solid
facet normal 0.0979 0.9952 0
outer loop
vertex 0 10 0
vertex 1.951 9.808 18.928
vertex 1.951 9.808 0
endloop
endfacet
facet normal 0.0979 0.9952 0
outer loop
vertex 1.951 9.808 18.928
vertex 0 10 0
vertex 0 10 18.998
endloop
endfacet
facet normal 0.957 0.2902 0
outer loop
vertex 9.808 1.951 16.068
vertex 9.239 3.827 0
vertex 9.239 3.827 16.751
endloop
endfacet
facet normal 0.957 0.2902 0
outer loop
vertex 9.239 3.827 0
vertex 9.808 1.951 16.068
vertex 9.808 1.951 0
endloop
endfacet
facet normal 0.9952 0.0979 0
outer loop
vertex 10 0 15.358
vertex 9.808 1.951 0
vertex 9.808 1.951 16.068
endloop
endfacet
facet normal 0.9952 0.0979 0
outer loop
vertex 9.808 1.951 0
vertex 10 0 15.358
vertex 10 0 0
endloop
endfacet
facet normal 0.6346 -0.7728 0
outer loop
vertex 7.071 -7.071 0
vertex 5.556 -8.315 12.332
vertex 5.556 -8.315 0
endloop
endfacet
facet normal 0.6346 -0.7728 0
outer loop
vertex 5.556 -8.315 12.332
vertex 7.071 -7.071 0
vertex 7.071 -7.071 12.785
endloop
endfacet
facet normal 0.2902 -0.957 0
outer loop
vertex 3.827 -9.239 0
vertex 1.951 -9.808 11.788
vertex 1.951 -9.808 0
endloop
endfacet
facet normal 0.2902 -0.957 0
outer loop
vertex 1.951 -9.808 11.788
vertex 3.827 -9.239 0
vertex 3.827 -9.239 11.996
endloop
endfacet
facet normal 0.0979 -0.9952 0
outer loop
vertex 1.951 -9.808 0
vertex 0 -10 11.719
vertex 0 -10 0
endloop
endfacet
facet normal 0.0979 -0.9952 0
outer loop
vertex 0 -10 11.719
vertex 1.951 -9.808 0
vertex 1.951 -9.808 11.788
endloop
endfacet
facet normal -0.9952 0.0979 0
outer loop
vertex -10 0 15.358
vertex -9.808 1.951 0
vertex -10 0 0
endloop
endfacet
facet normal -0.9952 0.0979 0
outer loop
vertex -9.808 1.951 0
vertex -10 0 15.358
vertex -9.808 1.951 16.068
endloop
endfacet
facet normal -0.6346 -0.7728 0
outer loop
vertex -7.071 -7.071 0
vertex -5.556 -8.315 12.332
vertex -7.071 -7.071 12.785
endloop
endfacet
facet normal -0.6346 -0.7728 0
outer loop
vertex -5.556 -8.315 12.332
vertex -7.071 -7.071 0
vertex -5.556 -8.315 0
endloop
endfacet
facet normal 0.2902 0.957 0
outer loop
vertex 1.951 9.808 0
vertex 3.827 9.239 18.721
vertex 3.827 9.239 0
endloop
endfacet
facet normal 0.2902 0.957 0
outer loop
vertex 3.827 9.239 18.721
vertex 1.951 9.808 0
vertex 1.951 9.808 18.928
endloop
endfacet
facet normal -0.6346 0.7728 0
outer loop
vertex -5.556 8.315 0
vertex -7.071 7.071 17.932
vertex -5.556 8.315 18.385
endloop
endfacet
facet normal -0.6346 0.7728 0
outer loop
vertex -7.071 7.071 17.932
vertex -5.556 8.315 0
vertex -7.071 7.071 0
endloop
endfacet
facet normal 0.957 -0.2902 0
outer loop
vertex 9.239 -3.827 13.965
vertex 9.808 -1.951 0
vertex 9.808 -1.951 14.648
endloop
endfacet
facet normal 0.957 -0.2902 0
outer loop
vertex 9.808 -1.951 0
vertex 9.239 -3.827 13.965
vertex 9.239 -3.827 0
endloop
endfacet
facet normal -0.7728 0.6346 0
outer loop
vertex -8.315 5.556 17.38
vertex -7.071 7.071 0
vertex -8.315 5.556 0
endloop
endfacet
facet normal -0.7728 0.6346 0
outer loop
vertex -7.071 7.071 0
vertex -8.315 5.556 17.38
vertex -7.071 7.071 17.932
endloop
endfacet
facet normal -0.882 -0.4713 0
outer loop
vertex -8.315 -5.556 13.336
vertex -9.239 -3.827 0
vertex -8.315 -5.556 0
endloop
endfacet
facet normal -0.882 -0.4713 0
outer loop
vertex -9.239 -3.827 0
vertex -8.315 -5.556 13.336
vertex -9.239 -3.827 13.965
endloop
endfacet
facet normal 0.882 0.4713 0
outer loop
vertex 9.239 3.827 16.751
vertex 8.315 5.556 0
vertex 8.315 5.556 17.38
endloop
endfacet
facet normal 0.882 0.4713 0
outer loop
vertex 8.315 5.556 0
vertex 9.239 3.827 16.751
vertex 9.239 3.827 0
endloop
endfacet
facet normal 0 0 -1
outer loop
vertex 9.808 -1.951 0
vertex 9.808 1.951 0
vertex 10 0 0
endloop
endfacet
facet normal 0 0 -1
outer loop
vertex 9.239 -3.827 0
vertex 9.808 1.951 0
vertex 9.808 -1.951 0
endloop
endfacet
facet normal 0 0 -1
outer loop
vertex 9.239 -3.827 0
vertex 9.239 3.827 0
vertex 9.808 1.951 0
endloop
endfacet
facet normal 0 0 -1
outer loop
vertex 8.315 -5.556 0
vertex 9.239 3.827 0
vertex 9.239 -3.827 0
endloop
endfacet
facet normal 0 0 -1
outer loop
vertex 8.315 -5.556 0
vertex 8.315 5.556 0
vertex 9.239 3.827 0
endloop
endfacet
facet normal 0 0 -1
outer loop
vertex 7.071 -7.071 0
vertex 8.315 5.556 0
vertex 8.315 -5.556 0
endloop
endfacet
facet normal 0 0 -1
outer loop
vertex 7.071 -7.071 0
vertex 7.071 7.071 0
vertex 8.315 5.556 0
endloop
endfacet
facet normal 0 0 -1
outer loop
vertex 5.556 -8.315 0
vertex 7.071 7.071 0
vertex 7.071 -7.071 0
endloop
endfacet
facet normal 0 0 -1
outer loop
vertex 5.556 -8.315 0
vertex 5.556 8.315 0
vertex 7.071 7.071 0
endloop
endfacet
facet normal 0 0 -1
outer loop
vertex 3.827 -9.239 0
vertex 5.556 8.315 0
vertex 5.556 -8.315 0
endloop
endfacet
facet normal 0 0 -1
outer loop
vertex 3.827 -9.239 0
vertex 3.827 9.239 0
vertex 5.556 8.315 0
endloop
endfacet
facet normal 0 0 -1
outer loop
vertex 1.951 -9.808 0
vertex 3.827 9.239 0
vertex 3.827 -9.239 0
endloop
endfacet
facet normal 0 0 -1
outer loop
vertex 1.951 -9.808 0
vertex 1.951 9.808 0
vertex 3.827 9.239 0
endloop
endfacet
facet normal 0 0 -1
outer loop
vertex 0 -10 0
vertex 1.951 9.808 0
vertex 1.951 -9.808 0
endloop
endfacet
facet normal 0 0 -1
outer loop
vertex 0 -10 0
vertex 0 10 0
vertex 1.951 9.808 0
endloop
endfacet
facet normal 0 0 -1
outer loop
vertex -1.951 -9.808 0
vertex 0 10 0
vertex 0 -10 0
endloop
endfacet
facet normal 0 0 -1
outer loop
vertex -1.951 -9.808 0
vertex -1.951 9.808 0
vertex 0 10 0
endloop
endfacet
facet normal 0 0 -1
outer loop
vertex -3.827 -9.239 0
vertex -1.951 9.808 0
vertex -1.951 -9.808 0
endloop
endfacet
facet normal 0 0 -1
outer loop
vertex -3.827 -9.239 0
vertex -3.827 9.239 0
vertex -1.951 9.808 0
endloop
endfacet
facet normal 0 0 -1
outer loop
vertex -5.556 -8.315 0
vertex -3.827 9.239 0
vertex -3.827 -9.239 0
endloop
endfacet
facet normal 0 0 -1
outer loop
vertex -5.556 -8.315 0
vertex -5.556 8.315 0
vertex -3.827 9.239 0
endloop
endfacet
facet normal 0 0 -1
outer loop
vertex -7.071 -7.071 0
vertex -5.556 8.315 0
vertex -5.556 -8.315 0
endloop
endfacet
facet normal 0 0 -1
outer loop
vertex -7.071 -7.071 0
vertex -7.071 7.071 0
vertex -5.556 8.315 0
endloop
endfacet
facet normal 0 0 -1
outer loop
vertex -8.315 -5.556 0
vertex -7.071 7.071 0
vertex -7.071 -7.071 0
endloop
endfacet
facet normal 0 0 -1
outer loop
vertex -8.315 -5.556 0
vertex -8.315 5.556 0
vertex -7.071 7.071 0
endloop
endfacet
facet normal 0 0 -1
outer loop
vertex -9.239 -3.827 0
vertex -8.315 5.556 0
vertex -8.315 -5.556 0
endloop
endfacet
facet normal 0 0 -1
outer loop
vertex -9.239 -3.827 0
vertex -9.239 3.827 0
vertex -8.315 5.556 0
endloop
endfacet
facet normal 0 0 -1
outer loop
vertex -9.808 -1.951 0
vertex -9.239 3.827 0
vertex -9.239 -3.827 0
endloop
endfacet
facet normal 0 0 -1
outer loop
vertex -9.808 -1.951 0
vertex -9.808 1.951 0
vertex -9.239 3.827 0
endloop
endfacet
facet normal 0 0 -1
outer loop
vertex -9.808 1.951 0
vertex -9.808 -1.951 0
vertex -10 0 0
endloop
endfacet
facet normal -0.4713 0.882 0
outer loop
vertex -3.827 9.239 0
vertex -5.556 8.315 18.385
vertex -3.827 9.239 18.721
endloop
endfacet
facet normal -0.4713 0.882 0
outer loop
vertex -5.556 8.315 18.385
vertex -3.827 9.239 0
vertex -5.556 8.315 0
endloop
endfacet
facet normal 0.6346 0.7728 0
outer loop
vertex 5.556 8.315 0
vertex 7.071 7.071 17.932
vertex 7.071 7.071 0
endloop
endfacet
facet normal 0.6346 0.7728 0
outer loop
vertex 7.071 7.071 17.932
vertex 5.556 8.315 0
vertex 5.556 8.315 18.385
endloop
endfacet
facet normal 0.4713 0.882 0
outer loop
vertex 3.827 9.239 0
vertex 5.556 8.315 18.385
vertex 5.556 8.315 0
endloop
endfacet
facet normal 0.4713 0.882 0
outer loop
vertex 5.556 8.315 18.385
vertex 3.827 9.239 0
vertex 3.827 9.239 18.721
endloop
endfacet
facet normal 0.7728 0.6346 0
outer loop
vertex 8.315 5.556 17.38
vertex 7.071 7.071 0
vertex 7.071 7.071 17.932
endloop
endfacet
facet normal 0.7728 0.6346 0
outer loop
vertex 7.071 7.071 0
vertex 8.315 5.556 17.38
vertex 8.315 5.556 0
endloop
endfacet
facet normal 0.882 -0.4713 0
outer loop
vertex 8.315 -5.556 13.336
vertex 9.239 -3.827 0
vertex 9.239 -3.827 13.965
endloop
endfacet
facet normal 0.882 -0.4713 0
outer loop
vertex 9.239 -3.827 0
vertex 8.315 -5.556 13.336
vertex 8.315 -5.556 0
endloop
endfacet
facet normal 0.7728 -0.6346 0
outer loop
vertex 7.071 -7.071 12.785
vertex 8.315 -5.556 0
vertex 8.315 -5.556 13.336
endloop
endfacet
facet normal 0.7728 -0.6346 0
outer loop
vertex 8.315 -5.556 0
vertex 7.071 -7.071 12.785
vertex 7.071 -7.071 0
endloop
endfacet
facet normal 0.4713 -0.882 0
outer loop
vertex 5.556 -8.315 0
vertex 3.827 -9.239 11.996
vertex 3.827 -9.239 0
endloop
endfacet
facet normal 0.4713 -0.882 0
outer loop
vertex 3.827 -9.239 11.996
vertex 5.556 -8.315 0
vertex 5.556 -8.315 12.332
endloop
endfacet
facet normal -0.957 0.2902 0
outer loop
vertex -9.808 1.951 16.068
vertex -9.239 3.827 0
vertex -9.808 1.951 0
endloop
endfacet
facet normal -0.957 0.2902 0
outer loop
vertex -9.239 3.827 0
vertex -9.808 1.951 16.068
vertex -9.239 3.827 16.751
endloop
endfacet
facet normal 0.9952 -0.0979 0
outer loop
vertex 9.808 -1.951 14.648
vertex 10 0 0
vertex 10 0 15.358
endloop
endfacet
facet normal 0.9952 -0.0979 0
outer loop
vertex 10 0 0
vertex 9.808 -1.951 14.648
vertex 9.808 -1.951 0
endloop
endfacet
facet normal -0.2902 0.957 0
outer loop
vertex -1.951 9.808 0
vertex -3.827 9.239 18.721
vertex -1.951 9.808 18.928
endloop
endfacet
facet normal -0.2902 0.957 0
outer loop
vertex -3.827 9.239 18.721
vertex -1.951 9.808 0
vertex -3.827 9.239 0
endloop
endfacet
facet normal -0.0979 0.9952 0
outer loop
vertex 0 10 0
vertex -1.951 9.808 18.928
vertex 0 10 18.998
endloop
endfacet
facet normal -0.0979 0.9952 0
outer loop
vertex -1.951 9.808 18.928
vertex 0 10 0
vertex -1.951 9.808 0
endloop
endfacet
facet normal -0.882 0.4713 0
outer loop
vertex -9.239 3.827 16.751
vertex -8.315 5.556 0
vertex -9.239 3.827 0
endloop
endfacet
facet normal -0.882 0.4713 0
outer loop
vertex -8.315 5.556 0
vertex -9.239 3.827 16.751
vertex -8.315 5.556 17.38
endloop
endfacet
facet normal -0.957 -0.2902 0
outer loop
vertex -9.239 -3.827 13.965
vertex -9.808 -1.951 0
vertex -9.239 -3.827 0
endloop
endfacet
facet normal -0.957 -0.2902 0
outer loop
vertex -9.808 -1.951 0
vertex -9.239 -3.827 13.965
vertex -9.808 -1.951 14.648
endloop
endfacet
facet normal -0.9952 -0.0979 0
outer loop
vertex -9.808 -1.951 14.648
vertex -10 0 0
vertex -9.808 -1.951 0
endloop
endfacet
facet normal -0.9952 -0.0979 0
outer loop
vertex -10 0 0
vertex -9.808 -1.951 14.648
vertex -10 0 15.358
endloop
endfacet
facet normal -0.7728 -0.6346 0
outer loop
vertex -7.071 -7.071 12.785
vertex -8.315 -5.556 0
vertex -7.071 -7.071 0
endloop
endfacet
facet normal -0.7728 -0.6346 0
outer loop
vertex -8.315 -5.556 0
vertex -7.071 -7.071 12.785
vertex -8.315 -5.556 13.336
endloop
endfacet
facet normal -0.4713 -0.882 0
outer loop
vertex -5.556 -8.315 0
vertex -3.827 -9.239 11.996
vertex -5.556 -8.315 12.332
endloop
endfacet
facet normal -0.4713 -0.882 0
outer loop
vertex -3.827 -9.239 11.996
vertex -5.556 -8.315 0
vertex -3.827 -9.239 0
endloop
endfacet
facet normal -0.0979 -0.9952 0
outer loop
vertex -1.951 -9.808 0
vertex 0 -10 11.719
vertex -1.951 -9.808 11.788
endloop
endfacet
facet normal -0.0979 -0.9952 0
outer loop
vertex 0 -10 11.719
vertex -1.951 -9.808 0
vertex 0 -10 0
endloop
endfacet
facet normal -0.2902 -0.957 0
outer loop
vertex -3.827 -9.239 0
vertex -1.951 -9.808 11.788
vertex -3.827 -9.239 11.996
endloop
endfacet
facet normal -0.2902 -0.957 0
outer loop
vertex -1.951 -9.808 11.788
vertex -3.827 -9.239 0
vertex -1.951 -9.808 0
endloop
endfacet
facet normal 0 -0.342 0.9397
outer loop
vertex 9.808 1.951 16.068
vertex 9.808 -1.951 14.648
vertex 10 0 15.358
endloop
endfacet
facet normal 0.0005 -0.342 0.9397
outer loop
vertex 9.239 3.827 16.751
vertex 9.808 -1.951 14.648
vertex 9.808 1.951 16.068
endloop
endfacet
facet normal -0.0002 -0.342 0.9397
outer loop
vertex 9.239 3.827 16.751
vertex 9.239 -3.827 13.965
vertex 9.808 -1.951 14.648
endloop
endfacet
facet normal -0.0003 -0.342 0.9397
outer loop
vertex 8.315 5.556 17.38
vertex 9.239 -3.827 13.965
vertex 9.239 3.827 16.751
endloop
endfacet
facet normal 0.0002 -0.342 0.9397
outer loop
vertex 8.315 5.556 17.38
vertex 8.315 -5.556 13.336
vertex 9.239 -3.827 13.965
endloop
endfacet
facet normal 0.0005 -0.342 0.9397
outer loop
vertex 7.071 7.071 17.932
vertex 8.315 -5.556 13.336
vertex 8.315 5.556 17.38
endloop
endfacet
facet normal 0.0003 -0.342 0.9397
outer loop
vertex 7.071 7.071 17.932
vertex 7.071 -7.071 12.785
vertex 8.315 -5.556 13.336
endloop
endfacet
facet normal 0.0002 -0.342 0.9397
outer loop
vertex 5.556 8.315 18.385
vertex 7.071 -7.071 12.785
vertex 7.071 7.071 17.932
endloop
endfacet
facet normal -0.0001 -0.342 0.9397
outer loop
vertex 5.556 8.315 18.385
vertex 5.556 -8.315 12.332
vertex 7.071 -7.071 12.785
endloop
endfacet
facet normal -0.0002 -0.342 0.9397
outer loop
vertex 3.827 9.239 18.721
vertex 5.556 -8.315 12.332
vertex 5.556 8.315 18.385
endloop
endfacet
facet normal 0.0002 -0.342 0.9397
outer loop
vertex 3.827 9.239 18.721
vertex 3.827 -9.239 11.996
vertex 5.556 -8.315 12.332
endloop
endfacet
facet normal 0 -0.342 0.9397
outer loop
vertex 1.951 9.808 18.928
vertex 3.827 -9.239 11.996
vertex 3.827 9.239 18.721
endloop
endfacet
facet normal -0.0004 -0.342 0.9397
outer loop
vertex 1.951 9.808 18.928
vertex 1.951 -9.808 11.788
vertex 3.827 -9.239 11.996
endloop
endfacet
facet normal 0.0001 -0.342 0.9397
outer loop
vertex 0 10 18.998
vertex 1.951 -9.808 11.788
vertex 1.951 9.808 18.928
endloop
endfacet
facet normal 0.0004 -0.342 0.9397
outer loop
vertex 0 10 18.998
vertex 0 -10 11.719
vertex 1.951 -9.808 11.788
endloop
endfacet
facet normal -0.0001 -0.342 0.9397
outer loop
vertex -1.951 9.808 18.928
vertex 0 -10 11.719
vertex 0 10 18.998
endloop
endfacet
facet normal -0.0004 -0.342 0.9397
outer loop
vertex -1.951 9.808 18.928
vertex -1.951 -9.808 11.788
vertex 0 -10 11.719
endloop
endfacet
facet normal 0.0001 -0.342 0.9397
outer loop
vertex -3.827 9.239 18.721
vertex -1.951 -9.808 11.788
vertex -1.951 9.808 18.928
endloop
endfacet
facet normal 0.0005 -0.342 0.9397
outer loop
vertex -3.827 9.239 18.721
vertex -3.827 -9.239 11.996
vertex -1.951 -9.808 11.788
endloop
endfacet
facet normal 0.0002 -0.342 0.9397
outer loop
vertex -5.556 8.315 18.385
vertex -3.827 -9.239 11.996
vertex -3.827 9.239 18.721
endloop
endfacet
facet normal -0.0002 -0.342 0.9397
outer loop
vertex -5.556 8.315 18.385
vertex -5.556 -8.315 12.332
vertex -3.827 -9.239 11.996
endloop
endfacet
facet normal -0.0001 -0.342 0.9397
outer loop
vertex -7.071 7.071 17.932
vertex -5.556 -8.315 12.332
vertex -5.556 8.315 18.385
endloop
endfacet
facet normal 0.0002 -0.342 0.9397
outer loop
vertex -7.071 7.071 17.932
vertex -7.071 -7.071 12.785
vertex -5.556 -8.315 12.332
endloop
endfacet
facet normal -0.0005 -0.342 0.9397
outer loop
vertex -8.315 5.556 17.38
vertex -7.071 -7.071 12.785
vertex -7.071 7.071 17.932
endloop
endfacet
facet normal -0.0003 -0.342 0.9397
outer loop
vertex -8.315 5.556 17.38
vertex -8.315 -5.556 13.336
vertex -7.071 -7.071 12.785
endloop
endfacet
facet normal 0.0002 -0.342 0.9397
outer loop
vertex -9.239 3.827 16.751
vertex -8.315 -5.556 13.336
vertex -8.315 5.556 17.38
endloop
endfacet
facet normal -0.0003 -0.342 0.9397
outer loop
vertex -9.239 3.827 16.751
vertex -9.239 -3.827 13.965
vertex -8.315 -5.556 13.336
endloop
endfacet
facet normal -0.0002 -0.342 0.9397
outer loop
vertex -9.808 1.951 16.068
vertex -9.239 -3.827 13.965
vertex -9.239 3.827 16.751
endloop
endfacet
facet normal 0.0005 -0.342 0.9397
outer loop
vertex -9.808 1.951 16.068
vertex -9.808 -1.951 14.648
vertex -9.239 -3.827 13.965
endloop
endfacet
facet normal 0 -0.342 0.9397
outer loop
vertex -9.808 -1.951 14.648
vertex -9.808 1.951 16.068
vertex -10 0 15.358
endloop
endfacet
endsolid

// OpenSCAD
// A cylinder cut off at an angle, so its rim is an ellipse.
//
// The band model this exporter recognises cylinders with is two rims at
// constant height along the axis, and every gate in it says so: the axis comes
// from crossing two chords, which assumes chords lie in planes perpendicular to
// it; the probe fits a circle to each rim; and every wall vertex has to sit at
// one of two heights. A trim which is not perpendicular to the axis fails all
// three, and it failed them *silently* - three separate rejections with no
// reason recorded, so the report said only that one declared cylinder had gone
// out as facets, and not why.
//
// Nothing about such a cut stops the wall being a cylinder. Every vertex of it
// still lies on the true surface, exactly, because the vertices of the cut are
// where the exact plane meets the prism's exact rulings. What stops being true
// is only that the rim is at one height, and the rim is then a conic instead of
// a circle: radius r cut at a plane whose normal makes cos t with the axis
// gives an ellipse with semi-axes r/cos t and r. At 20 degrees on r=10 that is
// 10.6417777 and 10, which is what the ELLIPSE in the export reads.
//
// So the axis is taken from the rulings instead, where a cylinder states it
// exactly and with no pairing; the probe assumes a cylinder unless the far rim
// is flat enough to fit a circle and make it a cone; and the vertices off the
// flat rim have to be coplanar rather than level. A cone is still refused - cut
// one off-axis and the rim has no single radius, so the ellipse written here
// would be the wrong curve rather than an imprecise one - and so is a partial
// turn, which would need an elliptical arc and the arc machinery is written for
// circles.
//
// EXPECT: 1 analytic surface available (1 cylindrical, 0 spherical, 0 toroidal, 0 Bezier)
// EXPECT: 1 surface recognised (0 toroidal, 0 spherical, 0 conical, 0 partial), 32 facets replaced
//
// What a kernel makes of it. Validity would pass on the faceted export too, so
// the surface census is what says the cylinder survived as one surface rather
// than as the 32 planes it replaced.
// ROUNDTRIP: Cylinder=1 Plane=2
// RADII: Cylinder=10
//
// And the rim survives as the conic it was written as, not resampled into
// a spline or split into arcs. This is the line that would notice a kernel
// quietly rebuilding the trim it was handed.
// EDGES: Circle=1 Ellipse=1 Line=1
//
// And the volume says the surface is the *right* one. The exact solid is a
// cylinder of radius 10 whose mean height is 26 - 10/cos 20 = 15.3582223, so
// pi*100*that = 4824.9153; OpenCASCADE reads 4824.915473 back. The mesh's own
// volume is 4793.98, short by the chord deficit of a 32-gon against its circle
// - 0.993558 of the area, measured 0.99356. The fit gives that back and claims
// nothing further: it is the tessellation band, not an invention.
$fn = 32;
difference() {
	cylinder(r = 10, h = 20);
	translate([0, 0, 26]) rotate([20, 0, 0]) cube([60, 60, 20], center = true);
}
